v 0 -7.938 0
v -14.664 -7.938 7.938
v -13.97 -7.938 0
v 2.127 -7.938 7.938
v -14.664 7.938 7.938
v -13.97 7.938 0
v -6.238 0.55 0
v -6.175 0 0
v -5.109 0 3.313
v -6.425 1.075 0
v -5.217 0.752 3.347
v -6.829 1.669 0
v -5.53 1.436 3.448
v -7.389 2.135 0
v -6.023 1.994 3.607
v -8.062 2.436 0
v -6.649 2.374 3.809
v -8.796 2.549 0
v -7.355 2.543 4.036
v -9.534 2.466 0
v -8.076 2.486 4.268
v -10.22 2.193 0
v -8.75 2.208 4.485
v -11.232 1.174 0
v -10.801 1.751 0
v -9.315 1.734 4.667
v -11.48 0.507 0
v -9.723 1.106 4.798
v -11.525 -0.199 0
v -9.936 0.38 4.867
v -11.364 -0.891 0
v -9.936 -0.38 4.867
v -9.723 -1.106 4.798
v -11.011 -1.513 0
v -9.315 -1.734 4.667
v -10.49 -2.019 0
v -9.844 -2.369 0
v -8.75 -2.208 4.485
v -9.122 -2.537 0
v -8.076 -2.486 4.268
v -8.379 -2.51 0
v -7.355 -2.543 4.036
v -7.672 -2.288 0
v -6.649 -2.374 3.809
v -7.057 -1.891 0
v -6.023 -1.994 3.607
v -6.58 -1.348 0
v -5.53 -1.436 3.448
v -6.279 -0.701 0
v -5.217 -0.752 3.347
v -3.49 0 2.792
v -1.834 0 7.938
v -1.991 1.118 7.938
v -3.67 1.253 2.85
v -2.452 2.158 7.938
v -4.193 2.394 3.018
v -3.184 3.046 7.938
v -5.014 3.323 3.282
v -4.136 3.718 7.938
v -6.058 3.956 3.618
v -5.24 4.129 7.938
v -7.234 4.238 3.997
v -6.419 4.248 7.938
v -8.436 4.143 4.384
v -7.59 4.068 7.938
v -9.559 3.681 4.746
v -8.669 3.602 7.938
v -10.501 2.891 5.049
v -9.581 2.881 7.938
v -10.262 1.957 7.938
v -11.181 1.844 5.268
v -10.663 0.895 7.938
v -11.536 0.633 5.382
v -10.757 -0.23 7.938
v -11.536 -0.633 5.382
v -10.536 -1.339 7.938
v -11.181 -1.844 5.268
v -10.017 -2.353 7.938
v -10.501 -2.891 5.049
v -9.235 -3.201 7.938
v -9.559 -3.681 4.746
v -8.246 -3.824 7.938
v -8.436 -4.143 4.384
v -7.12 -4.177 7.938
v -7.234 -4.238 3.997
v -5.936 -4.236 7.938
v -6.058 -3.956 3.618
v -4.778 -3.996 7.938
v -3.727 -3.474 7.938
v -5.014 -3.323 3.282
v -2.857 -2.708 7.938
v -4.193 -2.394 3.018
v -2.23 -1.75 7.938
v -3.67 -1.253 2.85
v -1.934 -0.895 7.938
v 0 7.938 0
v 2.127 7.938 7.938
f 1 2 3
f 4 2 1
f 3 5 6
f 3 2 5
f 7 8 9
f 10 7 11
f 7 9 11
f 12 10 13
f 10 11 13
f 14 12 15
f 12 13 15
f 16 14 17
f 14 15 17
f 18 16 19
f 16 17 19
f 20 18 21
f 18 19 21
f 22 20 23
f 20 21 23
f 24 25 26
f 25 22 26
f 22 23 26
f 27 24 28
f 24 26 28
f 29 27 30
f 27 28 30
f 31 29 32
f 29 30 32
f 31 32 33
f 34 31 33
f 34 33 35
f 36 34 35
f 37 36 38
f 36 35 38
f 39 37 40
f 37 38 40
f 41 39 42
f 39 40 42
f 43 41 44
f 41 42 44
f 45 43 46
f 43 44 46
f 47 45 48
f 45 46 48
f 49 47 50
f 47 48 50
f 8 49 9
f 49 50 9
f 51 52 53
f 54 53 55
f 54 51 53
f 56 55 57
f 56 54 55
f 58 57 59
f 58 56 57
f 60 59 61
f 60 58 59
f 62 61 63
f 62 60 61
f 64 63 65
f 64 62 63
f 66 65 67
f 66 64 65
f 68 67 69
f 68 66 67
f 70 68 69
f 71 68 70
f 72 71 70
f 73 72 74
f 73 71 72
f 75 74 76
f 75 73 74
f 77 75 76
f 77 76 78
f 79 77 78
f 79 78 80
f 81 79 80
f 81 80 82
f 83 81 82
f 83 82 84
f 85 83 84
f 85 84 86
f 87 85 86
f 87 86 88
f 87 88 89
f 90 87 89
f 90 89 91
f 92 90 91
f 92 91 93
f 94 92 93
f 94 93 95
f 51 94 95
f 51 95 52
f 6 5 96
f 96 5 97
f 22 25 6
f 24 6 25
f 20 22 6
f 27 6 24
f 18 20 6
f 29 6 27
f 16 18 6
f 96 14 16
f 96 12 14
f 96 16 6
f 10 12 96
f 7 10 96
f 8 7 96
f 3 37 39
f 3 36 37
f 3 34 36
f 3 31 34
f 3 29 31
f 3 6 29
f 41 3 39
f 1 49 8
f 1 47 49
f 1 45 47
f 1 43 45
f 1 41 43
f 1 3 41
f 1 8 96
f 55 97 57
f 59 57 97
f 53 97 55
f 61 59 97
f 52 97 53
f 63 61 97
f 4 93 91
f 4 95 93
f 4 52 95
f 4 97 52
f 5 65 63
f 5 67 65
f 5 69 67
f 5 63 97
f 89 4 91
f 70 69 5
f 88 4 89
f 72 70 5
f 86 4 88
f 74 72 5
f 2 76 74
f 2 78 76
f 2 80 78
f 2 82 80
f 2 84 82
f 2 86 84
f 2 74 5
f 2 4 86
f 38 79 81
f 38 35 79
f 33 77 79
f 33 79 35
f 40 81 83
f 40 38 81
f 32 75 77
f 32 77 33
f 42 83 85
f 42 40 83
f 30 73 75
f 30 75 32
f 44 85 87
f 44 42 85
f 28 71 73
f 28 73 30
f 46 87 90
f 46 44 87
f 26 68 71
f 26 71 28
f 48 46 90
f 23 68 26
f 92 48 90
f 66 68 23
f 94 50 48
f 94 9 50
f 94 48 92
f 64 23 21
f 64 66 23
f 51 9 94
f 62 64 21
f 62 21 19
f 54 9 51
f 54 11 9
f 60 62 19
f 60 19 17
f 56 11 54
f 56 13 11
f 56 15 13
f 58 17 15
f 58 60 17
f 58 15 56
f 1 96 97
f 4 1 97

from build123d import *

# Parameters (mm, degrees)
F1_DEPTH      = 7.9375
F1_DEPTH_BACK = 7.9375
F4_R          = 2.55
F5_DEPTH      = 25.4
F5_DEPTH_BACK = 25.4
F6_START      = 1.5875
F4_R_2        = 4.25
F6_DEPTH      = 23.8125


with BuildPart() as f1:
    # F0 (on Front) → F1 (new body, two sides)
    with BuildSketch(Plane.XZ) as f1_sk:
        Polygon((-13.97, 0), (0, 0), (2.1268467149, 7.9375), (-14.6644412667, 7.9375), align=None)
    extrude(amount=F1_DEPTH)
    extrude(f1_sk.sketch, amount=-F1_DEPTH_BACK)

    # F4 (on line) → F5 (cut, two sides)
    with BuildSketch(Plane(origin=(0, 0, 0), x_dir=(0.9518743809, 0, -0.3064884386), z_dir=(0.3064884386, 0, 0.9518743809))) as f5_sk:
        with Locations((-8.4281116724, 0)):
            Circle(F4_R)
    extrude(amount=-F5_DEPTH, mode=Mode.SUBTRACT)
    extrude(f5_sk.sketch, amount=F5_DEPTH_BACK, mode=Mode.SUBTRACT)

    # F4 (on line) → F6 (cut)
    with BuildSketch(Plane(origin=(0, 0, 0), x_dir=(0.9518743809, 0, -0.3064884386), z_dir=(0.3064884386, 0, 0.9518743809)).offset(F6_START)):
        with Locations((-8.4281116724, 0)):
            Circle(F4_R_2)
        with Locations((-8.4281116724, 0)):
            Circle(F4_R, mode=Mode.SUBTRACT)
    extrude(amount=F6_DEPTH, mode=Mode.SUBTRACT)


solid = f1.part
